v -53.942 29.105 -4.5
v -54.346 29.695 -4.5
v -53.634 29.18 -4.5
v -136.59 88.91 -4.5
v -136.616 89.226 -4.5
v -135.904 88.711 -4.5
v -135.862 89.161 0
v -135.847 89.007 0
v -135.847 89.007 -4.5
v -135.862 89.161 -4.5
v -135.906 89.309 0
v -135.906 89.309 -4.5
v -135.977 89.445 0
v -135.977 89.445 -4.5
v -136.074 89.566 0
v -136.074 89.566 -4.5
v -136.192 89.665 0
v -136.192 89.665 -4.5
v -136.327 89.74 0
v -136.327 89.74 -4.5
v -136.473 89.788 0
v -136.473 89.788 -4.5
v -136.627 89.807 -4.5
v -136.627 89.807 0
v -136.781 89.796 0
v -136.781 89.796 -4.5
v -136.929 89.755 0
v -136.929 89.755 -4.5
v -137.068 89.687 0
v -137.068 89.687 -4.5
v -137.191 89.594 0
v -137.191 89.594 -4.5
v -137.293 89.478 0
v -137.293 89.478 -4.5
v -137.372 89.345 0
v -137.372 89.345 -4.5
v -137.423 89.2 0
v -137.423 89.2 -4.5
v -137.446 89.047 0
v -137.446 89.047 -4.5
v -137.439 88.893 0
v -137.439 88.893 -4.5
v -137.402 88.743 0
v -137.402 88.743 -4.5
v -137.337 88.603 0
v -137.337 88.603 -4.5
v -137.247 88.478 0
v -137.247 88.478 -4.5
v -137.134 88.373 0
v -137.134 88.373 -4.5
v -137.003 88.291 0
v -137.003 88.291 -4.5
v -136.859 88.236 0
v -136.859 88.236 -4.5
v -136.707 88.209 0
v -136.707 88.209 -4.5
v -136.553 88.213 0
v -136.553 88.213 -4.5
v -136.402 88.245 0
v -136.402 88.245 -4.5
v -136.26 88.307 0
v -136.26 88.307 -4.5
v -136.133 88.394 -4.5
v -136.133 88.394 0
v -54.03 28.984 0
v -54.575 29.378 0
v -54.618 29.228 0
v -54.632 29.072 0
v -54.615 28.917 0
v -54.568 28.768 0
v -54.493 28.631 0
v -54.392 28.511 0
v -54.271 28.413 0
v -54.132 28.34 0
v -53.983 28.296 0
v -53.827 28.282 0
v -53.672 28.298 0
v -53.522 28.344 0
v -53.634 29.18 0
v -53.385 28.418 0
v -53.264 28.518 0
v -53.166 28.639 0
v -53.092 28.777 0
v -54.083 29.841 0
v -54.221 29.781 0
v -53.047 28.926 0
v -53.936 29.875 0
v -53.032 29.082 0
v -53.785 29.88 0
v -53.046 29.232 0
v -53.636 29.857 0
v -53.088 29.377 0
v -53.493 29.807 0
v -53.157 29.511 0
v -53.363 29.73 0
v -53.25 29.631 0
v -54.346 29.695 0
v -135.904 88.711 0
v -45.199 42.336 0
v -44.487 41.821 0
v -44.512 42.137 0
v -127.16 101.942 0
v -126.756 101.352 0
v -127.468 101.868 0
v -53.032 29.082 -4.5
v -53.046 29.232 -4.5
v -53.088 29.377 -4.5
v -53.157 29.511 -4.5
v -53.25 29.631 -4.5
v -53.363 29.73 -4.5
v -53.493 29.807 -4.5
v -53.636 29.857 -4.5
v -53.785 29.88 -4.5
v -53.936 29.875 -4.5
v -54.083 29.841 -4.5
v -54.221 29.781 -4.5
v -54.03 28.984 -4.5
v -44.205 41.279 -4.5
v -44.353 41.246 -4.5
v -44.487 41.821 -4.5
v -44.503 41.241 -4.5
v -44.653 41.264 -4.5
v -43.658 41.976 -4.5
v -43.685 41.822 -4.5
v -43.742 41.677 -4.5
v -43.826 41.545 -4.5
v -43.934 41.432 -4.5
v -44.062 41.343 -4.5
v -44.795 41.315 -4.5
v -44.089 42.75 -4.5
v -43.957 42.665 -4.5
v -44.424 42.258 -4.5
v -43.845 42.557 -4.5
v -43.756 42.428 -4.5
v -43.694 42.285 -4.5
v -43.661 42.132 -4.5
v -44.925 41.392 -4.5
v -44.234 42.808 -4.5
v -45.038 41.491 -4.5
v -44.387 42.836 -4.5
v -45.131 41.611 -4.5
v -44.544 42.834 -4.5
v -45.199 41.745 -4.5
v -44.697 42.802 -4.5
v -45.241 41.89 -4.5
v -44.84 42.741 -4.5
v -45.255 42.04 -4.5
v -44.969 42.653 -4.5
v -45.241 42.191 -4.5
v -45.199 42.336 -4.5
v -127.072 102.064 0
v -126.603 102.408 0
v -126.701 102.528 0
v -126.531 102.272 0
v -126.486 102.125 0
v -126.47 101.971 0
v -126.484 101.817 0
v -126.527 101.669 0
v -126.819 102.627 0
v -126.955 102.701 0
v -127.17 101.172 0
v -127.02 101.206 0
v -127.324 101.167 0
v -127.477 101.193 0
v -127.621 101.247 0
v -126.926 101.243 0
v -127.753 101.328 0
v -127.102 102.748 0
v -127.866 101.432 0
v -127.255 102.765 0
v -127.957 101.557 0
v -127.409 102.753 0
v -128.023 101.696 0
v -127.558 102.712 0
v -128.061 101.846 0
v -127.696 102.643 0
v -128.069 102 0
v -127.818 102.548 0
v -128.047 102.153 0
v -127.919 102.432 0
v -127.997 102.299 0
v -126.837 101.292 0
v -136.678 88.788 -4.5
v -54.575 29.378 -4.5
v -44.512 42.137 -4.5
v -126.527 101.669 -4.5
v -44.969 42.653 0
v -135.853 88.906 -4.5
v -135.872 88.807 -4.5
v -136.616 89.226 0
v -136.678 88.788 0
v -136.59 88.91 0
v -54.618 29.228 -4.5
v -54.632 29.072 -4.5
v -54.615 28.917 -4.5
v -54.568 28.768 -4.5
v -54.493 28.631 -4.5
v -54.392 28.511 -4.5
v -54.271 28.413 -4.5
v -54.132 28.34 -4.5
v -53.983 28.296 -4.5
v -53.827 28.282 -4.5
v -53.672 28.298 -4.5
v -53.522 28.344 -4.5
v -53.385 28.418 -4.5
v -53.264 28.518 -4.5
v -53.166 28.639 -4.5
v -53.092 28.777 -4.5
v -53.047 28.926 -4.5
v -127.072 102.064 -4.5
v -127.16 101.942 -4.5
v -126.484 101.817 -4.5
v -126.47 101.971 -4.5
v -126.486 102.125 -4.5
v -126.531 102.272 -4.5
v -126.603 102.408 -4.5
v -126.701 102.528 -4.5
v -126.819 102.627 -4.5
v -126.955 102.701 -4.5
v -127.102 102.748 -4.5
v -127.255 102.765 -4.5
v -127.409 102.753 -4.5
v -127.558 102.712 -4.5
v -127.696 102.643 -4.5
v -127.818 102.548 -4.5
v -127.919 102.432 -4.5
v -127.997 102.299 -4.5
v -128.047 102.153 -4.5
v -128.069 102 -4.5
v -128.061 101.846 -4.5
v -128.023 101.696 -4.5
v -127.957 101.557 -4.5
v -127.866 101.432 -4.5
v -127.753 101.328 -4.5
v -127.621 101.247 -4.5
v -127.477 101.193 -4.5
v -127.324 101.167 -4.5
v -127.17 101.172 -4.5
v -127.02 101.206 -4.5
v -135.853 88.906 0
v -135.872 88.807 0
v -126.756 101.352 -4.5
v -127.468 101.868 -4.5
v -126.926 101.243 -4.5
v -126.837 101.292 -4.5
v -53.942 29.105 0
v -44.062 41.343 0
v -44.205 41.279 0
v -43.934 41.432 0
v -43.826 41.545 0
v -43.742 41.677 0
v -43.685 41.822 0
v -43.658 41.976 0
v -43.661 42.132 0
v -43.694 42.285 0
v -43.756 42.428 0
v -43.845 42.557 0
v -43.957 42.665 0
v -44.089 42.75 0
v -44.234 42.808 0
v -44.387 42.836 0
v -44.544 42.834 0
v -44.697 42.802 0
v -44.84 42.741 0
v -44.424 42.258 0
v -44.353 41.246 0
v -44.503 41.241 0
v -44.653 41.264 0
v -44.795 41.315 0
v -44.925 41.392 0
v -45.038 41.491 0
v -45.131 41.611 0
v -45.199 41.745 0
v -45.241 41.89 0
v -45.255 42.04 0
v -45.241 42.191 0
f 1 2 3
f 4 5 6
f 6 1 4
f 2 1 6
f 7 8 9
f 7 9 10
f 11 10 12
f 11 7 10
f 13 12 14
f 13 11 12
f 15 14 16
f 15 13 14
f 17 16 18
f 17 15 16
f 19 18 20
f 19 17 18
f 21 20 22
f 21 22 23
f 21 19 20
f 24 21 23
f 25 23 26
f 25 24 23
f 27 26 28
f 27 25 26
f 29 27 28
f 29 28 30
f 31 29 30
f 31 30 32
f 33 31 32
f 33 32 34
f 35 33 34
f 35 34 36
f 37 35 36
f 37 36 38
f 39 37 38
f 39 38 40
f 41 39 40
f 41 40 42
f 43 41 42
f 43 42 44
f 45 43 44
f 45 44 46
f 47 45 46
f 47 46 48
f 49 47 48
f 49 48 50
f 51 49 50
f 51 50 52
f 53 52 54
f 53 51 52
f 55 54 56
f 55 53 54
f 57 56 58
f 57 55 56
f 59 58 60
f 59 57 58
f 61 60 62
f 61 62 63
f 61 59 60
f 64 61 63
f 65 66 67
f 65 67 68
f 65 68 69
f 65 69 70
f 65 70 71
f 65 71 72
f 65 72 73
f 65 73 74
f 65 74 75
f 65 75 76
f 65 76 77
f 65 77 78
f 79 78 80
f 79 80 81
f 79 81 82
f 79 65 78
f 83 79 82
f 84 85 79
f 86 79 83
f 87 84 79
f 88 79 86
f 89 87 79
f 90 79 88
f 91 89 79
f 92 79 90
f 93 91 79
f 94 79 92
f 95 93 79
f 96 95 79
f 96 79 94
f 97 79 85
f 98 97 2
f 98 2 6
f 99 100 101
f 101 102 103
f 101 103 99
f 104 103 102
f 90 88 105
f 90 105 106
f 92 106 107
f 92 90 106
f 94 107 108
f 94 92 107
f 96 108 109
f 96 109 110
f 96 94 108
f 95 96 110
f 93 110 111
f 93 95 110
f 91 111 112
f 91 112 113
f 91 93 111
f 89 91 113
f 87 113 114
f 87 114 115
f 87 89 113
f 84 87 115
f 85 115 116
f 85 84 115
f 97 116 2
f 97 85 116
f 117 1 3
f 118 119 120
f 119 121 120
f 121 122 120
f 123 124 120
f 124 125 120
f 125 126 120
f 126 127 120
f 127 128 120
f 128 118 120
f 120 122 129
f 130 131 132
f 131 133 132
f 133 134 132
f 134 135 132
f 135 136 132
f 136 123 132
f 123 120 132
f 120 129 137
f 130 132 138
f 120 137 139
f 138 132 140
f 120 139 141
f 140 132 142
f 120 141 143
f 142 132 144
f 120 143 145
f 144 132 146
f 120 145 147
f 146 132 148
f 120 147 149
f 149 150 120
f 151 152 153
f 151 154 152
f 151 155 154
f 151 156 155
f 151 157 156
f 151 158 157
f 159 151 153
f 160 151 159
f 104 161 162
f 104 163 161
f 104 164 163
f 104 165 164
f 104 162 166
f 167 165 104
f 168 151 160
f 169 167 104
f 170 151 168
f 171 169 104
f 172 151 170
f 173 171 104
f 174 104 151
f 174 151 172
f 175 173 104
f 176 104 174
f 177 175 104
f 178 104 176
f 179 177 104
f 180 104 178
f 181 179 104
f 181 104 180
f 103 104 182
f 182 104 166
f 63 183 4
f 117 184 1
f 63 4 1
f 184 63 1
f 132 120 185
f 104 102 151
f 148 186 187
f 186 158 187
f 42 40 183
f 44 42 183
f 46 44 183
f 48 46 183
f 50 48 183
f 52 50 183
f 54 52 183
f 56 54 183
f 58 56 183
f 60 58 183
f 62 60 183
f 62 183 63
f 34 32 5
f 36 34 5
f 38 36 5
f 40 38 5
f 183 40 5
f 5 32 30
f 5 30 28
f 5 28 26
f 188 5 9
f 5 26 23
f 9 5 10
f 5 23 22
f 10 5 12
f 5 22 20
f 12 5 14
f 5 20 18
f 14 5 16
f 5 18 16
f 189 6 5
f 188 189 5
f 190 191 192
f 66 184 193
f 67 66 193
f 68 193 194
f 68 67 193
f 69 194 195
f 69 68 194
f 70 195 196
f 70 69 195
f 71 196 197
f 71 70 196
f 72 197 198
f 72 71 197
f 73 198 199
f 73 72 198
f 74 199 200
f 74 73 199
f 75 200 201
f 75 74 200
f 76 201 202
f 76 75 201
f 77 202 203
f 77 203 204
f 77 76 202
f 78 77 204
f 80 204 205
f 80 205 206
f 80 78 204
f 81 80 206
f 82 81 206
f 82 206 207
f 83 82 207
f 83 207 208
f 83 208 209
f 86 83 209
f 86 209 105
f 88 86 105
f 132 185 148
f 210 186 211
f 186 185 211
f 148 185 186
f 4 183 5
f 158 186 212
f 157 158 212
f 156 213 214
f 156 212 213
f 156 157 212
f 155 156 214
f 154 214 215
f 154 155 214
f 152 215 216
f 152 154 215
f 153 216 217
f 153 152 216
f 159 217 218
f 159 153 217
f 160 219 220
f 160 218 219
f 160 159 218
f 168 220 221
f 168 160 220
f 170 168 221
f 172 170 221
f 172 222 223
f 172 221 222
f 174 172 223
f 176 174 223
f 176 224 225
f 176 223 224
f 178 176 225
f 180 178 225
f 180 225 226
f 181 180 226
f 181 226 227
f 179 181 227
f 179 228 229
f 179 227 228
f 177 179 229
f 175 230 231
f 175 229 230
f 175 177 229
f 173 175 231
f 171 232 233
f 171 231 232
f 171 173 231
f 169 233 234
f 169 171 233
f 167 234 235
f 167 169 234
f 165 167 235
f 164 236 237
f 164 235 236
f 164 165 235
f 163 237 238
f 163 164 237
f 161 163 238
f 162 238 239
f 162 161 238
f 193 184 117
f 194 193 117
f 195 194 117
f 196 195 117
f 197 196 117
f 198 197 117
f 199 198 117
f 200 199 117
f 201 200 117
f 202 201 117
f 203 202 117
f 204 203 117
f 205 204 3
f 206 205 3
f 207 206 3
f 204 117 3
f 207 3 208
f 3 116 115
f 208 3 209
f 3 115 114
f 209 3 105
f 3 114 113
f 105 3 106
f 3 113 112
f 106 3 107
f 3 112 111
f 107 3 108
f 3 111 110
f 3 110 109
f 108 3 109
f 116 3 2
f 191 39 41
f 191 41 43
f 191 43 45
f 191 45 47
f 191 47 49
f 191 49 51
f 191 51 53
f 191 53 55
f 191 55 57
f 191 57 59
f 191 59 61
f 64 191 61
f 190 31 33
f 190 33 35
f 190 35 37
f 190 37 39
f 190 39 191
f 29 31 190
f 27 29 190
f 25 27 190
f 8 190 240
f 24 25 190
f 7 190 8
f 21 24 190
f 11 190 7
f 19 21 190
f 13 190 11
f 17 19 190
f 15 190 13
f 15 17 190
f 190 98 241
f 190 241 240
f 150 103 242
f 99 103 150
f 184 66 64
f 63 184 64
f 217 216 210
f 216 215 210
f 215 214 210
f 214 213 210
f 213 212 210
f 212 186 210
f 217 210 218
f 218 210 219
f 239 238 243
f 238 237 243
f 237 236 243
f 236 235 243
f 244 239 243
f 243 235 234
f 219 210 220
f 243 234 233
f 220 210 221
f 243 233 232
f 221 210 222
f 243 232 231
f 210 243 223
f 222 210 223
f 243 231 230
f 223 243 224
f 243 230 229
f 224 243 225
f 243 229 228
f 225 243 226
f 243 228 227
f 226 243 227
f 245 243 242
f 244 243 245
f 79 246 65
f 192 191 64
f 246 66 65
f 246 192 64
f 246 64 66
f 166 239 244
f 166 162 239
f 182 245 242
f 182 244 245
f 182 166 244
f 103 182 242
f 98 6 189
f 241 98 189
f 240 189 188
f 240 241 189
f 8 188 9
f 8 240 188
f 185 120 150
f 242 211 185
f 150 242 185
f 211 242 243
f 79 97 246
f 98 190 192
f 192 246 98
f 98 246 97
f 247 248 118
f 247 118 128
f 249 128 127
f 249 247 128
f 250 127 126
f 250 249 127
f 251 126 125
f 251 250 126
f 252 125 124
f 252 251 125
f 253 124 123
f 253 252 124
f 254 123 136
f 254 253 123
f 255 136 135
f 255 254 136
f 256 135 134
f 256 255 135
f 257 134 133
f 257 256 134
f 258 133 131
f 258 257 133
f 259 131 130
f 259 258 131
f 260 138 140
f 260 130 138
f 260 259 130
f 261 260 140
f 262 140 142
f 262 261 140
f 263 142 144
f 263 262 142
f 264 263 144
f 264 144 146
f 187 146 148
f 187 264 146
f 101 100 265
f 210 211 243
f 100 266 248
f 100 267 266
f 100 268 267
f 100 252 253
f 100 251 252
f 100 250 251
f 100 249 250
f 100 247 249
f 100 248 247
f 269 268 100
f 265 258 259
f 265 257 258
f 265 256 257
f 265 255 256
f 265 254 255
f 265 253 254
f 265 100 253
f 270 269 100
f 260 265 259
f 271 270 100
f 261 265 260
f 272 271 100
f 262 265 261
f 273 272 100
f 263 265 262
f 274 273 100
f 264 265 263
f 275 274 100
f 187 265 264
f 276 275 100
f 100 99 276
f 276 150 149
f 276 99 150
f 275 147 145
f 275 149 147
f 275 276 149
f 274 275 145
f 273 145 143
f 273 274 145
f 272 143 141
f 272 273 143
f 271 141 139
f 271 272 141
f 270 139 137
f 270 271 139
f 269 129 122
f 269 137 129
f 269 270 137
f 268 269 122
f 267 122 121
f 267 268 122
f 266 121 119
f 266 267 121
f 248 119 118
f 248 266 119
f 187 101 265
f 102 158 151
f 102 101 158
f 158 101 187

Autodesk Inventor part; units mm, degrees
ref_plane "YZ Plane" through (0, 0, 0) normal (1, 0, 0) x (0, 1, 0)
ref_plane "XZ Plane" through (0, 0, 0) normal (0, 1, 0) x (-1, 0, 0)
ref_plane "XY Plane" through (0, 0, 0) normal (0, 0, 1) x (1, 0, 0)
ref_plane "Plano de trabajo1" through (0, 0, 0) normal (0, 0, 1) x (1, 0, 0)
sketch "Boceto1" plane through (0, 0, 0) normal (0, 0, 1) x (1, 0, 0)
  line L0 (-46.3948, 33.5716) -> (-52.5431, 31.0384) projected
  line L1 (-45.911, 40.2037) -> (-46.3948, 33.5716) projected
  line L2 (-128.559, 100.0083) -> (-45.911, 40.2037) projected
  line L3 (-134.7073, 97.4751) -> (-128.559, 100.0083) projected
  line L4 (-135.1911, 90.843) -> (-134.7073, 97.4751) projected
  line L5 (-52.5431, 31.0384) -> (-135.1911, 90.843) projected
  line L6 (-127.1601, 101.9415) -> (-44.5121, 42.1369) projected
  line L7 (-126.3896, 103.0063) -> (-43.7416, 43.2017) projected
  line L8 (-53.942, 29.1052) -> (-136.59, 88.9098) projected
  line L9 (-137.3604, 87.845) -> (-136.59, 88.9098) projected
  line L10 (-54.7125, 28.0404) -> (-137.3604, 87.845) projected
  line L11 (-126.3896, 103.0063) -> (-127.1601, 101.9415) projected
  line L12 (-136.0968, 89.5913) -> (-53.4489, 29.7866) projected
  line L13 (-45.0053, 41.4554) -> (-127.6532, 101.2601) projected
  line L14 (-127.1601, 101.9415) -> (-131.5092, 100.8886) projected
  line L15 (-136.0968, 89.5913) -> (-135.1911, 90.843) projected
  line L16 (-127.6532, 101.2601) -> (-128.559, 100.0083) projected
  line L17 (-136.59, 88.9098) -> (-136.9497, 93.3701) projected
  line L18 (-136.59, 88.9098) -> (-136.9497, 93.3701) projected
  line L19 (-53.942, 29.1052) -> (-136.59, 88.9098) projected
  line L20 (-49.5929, 30.1581) -> (-53.942, 29.1052) projected
  line L21 (-49.5929, 30.1581) -> (-136.9497, 93.3701) projected
  line L22 (-136.0968, 89.5913) -> (-136.6414, 89.5473)
  line L23 (-53.6337, 29.1798) -> (-136.8536, 89.3983)
  line L24 (-136.8536, 89.3983) -> (-135.6548, 91.0551)
  line L25 (-54.0299, 28.9836) -> (-136.6779, 88.7883)
  line L26 (-49.5929, 30.1581) -> (-53.942, 29.1052) projected
  line L27 (-54.7125, 28.0404) -> (-53.942, 29.1052) projected
  line L28 (-49.5929, 30.1581) -> (-53.942, 29.1052) projected
  line L29 (-53.4489, 29.7866) -> (-49.0998, 30.8396) projected
  line L30 (-53.4489, 29.7866) -> (-52.5431, 31.0384) projected
  line L31 (-54.0299, 28.9836) -> (-53.6337, 29.1798)
  line L32 (-136.6779, 88.7883) -> (-136.6155, 89.2259)
  point P0 (0, 0)
  dimension "d0" = 0.6
  dimension "d1" = 0.15
extrude "Extrusión1" add sketch "Boceto1" against normal blind 4.5 contours L31 L27 L20 | L20 L8 L17 L23 | L27 L25 L9 L8 | L17 L9 L32
ref_plane "Plano de trabajo2" through (-60.3674, 43.6822, 240.2336) normal (0.5862, 0.8101, 0) x (0.2891, -0.2092, 0.9342)
sketch "Boceto2" plane through (0, 0, 0) normal (0, 0, 1) x (1, 0, 0)
  line L0 (-53.6337, 29.1798) -> (-136.6155, 89.2259) projected
  line L1 (-136.6155, 89.2259) -> (-136.6779, 88.7883) projected
  line L2 (-136.6779, 88.7883) -> (-54.0299, 28.9836) projected
  line L3 (-54.0299, 28.9836) -> (-53.6337, 29.1798) projected
  circle A0 centre (-136.6467, 89.0071) radius 0.8
  circle A1 centre (-53.8318, 29.0817) radius 0.8
  point P0 (0, 0)
  point P1 (-54.5749, 29.378)
  point P2 (-54.3456, 29.6949)
  point P3 (-135.9036, 88.7108)
  point P4 (-136.1329, 88.3939)
  dimension "d4" = 1.6
  dimension "d5" = 1.6
extrude "Extrusión2" add sketch "Boceto2" against normal blind 4.5 contours L0 A1 L2 L3 | L0 L1 L2 A0 picked at (-53.7287, 28.8358) picked at (-136.9085, 89.0577)
mirror "Simetría1" about plane through (-60.3674, 43.6822, 240.2336) normal (0.5862, 0.8101, 0) of "Extrusión1", "Extrusión2"
properties part number "Soportes"
